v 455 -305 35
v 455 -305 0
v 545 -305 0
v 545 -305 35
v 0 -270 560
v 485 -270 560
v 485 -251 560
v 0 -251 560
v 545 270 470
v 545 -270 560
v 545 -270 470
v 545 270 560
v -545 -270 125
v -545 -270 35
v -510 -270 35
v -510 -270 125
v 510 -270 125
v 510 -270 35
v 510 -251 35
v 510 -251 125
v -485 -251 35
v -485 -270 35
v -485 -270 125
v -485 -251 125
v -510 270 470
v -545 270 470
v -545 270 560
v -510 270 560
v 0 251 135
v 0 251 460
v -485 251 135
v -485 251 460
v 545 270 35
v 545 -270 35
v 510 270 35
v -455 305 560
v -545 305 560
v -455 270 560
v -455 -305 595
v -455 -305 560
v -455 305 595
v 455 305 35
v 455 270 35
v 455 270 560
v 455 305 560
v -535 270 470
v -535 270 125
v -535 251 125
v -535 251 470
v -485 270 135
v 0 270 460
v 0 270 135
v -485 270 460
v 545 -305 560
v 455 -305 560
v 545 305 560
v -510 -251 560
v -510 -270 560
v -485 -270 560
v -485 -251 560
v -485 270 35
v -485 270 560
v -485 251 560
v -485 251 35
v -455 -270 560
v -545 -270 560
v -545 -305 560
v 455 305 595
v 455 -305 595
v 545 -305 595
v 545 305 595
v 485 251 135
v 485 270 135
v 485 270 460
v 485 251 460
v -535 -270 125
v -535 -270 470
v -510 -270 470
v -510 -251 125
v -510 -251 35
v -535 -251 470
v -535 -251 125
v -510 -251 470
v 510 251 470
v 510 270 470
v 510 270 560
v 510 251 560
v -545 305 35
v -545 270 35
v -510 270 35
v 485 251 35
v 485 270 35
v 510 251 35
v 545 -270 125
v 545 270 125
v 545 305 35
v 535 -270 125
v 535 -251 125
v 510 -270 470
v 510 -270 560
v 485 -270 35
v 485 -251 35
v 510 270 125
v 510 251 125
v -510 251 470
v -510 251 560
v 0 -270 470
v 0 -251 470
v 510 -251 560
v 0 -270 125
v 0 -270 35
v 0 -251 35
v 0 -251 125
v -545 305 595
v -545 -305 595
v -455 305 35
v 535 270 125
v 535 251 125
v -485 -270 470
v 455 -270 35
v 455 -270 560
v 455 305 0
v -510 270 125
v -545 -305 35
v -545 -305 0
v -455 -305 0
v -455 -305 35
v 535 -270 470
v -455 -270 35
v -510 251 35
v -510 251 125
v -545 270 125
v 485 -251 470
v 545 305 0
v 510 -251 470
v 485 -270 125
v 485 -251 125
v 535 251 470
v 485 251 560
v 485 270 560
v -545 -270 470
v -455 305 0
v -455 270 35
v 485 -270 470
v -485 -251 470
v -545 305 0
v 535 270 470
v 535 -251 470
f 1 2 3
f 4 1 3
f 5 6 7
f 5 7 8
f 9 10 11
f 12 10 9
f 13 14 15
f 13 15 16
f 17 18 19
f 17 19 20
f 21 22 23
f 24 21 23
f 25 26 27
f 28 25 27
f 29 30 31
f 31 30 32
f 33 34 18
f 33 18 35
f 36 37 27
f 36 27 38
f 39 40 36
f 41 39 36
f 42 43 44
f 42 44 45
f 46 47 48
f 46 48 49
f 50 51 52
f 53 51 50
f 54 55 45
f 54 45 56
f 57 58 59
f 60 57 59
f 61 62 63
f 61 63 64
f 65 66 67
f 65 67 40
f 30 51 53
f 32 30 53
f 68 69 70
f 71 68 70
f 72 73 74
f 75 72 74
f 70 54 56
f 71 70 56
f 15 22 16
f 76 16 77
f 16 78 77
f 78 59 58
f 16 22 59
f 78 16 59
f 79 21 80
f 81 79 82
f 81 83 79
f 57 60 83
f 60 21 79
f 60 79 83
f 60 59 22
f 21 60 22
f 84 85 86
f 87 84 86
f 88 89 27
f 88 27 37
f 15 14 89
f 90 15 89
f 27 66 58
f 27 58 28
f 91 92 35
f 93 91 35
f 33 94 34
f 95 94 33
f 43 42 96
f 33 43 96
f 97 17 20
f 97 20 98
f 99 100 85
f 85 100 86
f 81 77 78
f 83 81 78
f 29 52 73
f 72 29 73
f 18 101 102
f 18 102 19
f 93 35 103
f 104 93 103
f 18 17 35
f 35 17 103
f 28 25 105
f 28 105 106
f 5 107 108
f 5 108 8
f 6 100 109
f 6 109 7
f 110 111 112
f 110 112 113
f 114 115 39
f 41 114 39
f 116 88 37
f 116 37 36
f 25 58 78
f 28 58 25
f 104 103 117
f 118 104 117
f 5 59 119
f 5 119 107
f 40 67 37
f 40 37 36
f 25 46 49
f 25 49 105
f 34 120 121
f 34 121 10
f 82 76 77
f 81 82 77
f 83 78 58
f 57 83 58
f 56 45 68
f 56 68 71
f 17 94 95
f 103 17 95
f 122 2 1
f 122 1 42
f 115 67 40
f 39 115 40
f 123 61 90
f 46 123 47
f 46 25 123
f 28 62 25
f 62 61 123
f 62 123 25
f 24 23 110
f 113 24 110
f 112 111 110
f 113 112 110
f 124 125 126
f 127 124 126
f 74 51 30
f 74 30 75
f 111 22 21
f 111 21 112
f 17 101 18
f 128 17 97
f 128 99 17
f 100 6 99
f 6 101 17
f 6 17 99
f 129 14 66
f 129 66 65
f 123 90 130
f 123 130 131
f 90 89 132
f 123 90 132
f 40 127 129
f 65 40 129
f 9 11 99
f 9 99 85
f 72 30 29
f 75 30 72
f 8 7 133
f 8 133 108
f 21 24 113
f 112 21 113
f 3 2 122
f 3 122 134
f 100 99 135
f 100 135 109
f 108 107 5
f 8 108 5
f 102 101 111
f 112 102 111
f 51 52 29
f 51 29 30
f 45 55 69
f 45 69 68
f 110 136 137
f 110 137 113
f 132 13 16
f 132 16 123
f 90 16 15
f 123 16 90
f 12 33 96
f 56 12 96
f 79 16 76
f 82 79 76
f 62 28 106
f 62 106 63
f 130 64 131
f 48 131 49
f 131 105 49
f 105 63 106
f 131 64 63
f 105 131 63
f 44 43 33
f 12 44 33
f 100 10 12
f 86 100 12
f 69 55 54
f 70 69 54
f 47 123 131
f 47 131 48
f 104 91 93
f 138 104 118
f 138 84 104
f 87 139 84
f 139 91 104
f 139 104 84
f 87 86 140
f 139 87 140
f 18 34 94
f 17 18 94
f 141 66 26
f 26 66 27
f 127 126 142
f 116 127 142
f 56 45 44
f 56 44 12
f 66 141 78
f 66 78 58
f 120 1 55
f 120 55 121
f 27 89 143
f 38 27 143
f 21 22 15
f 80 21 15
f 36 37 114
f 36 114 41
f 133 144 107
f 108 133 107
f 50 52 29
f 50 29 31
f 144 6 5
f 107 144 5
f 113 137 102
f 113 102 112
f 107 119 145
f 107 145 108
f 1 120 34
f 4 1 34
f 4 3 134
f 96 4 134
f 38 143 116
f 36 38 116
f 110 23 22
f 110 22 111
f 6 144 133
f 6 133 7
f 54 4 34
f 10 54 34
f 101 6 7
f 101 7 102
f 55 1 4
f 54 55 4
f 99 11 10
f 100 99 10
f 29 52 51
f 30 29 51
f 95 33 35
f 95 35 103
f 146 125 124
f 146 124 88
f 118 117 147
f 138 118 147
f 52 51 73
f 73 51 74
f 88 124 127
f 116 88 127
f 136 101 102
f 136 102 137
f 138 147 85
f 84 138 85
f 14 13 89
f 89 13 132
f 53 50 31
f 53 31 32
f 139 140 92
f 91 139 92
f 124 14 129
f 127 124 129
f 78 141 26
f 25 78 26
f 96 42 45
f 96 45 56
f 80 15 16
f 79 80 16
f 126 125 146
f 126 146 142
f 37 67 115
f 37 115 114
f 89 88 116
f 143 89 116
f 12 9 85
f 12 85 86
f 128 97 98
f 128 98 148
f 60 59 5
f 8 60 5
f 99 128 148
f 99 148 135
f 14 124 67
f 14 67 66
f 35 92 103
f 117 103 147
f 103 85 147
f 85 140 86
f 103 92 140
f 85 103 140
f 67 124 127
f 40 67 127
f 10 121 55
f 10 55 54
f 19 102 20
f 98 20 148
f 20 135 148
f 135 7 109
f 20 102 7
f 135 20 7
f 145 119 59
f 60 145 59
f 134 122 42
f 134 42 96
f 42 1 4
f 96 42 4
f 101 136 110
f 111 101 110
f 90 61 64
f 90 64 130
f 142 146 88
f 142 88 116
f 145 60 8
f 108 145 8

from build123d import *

# Parameters (mm, degrees)
F0_W      = 90
F0_H      = 610
F1_DEPTH  = 35
F2_W      = 90
F2_H      = 35
F3_DEPTH  = 525
F4_W      = 90
F4_H      = 610
F5_DEPTH  = 35
F6_W      = 540
F6_H      = 90
F7_DEPTH  = 35
F9_DEPTH  = 19
F11_W     = 485
F11_H     = 325
F12_DEPTH = 19
F13_W     = 485
F13_H     = 90
F14_DEPTH = 19


with BuildPart() as f1:
    # F0 (on Top) → F1 (new body)
    with BuildSketch(Plane.XY):
        with Locations((-500, 0)):
            Rectangle(F0_W, F0_H)
        with Locations((500, 0)):
            Rectangle(F0_W, F0_H)
    extrude(amount=F1_DEPTH)


with BuildPart() as f3:
    # F2 (on face) → F3 (new body)
    with BuildSketch(Plane.XY.offset(35)):
        with Locations((-500, 287.5)):
            Rectangle(F2_W, F2_H)
        with Locations((-500, -287.5)):
            Rectangle(F2_W, F2_H)
        with Locations((500, 287.5)):
            Rectangle(F2_W, F2_H)
        with Locations((500, -287.5)):
            Rectangle(F2_W, F2_H)
    extrude(amount=F3_DEPTH)


with BuildPart() as f5:
    # F4 (on face) → F5 (new body)
    with BuildSketch(Plane.XY.offset(560)):
        with Locations((-500, 0)):
            Rectangle(F4_W, F4_H)
        with Locations((500, 0)):
            Rectangle(F4_W, F4_H)
    extrude(amount=F5_DEPTH)


with BuildPart() as f7:
    # F6 (on face) → F7 (new body)
    with BuildSketch(Plane.YZ.offset(545)):
        with Locations((0, 80)):
            Rectangle(F6_W, F6_H)
        with Locations((0, 515)):
            Rectangle(F6_W, F6_H)
    extrude(amount=-F7_DEPTH)


with BuildPart() as f9:
    # F8 (on face) → F9 (new body)
    with BuildSketch(Plane.XZ.offset(-270)):
        Polygon((485, 560), (485, 35), (510, 35), (510, 125), (535, 125), (535, 470), (510, 470), (510, 560), align=None)
    extrude(amount=F9_DEPTH)


with BuildPart() as f10_1:
    # F10: instance of F9
    add(f9.part.mirror(Plane.XZ))


with BuildPart() as f12:
    # F11 (on face) → F12 (new body)
    with BuildSketch(Plane.XZ.offset(-270)):
        with Locations((242.5, 297.5)):
            Rectangle(F11_W, F11_H)
    extrude(amount=F12_DEPTH)


with BuildPart() as f14:
    # F13 (on face) → F14 (new body)
    with BuildSketch(Plane(origin=(0, -270, 0), x_dir=(-1, 0, 0), z_dir=(0, 1, 0))):
        with Locations((-242.5, 515)):
            Rectangle(F13_W, F13_H)
        with Locations((-242.5, 80)):
            Rectangle(F13_W, F13_H)
    extrude(amount=F14_DEPTH)


with BuildPart() as f15_1:
    # F15: instance of F7
    add(f7.part.mirror(Plane.YZ))


with BuildPart() as f15_2:
    # F15: instance of F9
    add(f9.part.mirror(Plane.YZ))


with BuildPart() as f15_3:
    # F15: instance of F10_1
    add(f10_1.part.mirror(Plane.YZ))


with BuildPart() as f15_4:
    # F15: instance of F14
    add(f14.part.mirror(Plane.YZ))


with BuildPart() as f15_5:
    # F15: instance of F12
    add(f12.part.mirror(Plane.YZ))


solid = Compound([f1.part, f3.part, f5.part, f7.part, f9.part, f10_1.part, f12.part, f14.part, f15_1.part, f15_2.part, f15_3.part, f15_4.part, f15_5.part])
